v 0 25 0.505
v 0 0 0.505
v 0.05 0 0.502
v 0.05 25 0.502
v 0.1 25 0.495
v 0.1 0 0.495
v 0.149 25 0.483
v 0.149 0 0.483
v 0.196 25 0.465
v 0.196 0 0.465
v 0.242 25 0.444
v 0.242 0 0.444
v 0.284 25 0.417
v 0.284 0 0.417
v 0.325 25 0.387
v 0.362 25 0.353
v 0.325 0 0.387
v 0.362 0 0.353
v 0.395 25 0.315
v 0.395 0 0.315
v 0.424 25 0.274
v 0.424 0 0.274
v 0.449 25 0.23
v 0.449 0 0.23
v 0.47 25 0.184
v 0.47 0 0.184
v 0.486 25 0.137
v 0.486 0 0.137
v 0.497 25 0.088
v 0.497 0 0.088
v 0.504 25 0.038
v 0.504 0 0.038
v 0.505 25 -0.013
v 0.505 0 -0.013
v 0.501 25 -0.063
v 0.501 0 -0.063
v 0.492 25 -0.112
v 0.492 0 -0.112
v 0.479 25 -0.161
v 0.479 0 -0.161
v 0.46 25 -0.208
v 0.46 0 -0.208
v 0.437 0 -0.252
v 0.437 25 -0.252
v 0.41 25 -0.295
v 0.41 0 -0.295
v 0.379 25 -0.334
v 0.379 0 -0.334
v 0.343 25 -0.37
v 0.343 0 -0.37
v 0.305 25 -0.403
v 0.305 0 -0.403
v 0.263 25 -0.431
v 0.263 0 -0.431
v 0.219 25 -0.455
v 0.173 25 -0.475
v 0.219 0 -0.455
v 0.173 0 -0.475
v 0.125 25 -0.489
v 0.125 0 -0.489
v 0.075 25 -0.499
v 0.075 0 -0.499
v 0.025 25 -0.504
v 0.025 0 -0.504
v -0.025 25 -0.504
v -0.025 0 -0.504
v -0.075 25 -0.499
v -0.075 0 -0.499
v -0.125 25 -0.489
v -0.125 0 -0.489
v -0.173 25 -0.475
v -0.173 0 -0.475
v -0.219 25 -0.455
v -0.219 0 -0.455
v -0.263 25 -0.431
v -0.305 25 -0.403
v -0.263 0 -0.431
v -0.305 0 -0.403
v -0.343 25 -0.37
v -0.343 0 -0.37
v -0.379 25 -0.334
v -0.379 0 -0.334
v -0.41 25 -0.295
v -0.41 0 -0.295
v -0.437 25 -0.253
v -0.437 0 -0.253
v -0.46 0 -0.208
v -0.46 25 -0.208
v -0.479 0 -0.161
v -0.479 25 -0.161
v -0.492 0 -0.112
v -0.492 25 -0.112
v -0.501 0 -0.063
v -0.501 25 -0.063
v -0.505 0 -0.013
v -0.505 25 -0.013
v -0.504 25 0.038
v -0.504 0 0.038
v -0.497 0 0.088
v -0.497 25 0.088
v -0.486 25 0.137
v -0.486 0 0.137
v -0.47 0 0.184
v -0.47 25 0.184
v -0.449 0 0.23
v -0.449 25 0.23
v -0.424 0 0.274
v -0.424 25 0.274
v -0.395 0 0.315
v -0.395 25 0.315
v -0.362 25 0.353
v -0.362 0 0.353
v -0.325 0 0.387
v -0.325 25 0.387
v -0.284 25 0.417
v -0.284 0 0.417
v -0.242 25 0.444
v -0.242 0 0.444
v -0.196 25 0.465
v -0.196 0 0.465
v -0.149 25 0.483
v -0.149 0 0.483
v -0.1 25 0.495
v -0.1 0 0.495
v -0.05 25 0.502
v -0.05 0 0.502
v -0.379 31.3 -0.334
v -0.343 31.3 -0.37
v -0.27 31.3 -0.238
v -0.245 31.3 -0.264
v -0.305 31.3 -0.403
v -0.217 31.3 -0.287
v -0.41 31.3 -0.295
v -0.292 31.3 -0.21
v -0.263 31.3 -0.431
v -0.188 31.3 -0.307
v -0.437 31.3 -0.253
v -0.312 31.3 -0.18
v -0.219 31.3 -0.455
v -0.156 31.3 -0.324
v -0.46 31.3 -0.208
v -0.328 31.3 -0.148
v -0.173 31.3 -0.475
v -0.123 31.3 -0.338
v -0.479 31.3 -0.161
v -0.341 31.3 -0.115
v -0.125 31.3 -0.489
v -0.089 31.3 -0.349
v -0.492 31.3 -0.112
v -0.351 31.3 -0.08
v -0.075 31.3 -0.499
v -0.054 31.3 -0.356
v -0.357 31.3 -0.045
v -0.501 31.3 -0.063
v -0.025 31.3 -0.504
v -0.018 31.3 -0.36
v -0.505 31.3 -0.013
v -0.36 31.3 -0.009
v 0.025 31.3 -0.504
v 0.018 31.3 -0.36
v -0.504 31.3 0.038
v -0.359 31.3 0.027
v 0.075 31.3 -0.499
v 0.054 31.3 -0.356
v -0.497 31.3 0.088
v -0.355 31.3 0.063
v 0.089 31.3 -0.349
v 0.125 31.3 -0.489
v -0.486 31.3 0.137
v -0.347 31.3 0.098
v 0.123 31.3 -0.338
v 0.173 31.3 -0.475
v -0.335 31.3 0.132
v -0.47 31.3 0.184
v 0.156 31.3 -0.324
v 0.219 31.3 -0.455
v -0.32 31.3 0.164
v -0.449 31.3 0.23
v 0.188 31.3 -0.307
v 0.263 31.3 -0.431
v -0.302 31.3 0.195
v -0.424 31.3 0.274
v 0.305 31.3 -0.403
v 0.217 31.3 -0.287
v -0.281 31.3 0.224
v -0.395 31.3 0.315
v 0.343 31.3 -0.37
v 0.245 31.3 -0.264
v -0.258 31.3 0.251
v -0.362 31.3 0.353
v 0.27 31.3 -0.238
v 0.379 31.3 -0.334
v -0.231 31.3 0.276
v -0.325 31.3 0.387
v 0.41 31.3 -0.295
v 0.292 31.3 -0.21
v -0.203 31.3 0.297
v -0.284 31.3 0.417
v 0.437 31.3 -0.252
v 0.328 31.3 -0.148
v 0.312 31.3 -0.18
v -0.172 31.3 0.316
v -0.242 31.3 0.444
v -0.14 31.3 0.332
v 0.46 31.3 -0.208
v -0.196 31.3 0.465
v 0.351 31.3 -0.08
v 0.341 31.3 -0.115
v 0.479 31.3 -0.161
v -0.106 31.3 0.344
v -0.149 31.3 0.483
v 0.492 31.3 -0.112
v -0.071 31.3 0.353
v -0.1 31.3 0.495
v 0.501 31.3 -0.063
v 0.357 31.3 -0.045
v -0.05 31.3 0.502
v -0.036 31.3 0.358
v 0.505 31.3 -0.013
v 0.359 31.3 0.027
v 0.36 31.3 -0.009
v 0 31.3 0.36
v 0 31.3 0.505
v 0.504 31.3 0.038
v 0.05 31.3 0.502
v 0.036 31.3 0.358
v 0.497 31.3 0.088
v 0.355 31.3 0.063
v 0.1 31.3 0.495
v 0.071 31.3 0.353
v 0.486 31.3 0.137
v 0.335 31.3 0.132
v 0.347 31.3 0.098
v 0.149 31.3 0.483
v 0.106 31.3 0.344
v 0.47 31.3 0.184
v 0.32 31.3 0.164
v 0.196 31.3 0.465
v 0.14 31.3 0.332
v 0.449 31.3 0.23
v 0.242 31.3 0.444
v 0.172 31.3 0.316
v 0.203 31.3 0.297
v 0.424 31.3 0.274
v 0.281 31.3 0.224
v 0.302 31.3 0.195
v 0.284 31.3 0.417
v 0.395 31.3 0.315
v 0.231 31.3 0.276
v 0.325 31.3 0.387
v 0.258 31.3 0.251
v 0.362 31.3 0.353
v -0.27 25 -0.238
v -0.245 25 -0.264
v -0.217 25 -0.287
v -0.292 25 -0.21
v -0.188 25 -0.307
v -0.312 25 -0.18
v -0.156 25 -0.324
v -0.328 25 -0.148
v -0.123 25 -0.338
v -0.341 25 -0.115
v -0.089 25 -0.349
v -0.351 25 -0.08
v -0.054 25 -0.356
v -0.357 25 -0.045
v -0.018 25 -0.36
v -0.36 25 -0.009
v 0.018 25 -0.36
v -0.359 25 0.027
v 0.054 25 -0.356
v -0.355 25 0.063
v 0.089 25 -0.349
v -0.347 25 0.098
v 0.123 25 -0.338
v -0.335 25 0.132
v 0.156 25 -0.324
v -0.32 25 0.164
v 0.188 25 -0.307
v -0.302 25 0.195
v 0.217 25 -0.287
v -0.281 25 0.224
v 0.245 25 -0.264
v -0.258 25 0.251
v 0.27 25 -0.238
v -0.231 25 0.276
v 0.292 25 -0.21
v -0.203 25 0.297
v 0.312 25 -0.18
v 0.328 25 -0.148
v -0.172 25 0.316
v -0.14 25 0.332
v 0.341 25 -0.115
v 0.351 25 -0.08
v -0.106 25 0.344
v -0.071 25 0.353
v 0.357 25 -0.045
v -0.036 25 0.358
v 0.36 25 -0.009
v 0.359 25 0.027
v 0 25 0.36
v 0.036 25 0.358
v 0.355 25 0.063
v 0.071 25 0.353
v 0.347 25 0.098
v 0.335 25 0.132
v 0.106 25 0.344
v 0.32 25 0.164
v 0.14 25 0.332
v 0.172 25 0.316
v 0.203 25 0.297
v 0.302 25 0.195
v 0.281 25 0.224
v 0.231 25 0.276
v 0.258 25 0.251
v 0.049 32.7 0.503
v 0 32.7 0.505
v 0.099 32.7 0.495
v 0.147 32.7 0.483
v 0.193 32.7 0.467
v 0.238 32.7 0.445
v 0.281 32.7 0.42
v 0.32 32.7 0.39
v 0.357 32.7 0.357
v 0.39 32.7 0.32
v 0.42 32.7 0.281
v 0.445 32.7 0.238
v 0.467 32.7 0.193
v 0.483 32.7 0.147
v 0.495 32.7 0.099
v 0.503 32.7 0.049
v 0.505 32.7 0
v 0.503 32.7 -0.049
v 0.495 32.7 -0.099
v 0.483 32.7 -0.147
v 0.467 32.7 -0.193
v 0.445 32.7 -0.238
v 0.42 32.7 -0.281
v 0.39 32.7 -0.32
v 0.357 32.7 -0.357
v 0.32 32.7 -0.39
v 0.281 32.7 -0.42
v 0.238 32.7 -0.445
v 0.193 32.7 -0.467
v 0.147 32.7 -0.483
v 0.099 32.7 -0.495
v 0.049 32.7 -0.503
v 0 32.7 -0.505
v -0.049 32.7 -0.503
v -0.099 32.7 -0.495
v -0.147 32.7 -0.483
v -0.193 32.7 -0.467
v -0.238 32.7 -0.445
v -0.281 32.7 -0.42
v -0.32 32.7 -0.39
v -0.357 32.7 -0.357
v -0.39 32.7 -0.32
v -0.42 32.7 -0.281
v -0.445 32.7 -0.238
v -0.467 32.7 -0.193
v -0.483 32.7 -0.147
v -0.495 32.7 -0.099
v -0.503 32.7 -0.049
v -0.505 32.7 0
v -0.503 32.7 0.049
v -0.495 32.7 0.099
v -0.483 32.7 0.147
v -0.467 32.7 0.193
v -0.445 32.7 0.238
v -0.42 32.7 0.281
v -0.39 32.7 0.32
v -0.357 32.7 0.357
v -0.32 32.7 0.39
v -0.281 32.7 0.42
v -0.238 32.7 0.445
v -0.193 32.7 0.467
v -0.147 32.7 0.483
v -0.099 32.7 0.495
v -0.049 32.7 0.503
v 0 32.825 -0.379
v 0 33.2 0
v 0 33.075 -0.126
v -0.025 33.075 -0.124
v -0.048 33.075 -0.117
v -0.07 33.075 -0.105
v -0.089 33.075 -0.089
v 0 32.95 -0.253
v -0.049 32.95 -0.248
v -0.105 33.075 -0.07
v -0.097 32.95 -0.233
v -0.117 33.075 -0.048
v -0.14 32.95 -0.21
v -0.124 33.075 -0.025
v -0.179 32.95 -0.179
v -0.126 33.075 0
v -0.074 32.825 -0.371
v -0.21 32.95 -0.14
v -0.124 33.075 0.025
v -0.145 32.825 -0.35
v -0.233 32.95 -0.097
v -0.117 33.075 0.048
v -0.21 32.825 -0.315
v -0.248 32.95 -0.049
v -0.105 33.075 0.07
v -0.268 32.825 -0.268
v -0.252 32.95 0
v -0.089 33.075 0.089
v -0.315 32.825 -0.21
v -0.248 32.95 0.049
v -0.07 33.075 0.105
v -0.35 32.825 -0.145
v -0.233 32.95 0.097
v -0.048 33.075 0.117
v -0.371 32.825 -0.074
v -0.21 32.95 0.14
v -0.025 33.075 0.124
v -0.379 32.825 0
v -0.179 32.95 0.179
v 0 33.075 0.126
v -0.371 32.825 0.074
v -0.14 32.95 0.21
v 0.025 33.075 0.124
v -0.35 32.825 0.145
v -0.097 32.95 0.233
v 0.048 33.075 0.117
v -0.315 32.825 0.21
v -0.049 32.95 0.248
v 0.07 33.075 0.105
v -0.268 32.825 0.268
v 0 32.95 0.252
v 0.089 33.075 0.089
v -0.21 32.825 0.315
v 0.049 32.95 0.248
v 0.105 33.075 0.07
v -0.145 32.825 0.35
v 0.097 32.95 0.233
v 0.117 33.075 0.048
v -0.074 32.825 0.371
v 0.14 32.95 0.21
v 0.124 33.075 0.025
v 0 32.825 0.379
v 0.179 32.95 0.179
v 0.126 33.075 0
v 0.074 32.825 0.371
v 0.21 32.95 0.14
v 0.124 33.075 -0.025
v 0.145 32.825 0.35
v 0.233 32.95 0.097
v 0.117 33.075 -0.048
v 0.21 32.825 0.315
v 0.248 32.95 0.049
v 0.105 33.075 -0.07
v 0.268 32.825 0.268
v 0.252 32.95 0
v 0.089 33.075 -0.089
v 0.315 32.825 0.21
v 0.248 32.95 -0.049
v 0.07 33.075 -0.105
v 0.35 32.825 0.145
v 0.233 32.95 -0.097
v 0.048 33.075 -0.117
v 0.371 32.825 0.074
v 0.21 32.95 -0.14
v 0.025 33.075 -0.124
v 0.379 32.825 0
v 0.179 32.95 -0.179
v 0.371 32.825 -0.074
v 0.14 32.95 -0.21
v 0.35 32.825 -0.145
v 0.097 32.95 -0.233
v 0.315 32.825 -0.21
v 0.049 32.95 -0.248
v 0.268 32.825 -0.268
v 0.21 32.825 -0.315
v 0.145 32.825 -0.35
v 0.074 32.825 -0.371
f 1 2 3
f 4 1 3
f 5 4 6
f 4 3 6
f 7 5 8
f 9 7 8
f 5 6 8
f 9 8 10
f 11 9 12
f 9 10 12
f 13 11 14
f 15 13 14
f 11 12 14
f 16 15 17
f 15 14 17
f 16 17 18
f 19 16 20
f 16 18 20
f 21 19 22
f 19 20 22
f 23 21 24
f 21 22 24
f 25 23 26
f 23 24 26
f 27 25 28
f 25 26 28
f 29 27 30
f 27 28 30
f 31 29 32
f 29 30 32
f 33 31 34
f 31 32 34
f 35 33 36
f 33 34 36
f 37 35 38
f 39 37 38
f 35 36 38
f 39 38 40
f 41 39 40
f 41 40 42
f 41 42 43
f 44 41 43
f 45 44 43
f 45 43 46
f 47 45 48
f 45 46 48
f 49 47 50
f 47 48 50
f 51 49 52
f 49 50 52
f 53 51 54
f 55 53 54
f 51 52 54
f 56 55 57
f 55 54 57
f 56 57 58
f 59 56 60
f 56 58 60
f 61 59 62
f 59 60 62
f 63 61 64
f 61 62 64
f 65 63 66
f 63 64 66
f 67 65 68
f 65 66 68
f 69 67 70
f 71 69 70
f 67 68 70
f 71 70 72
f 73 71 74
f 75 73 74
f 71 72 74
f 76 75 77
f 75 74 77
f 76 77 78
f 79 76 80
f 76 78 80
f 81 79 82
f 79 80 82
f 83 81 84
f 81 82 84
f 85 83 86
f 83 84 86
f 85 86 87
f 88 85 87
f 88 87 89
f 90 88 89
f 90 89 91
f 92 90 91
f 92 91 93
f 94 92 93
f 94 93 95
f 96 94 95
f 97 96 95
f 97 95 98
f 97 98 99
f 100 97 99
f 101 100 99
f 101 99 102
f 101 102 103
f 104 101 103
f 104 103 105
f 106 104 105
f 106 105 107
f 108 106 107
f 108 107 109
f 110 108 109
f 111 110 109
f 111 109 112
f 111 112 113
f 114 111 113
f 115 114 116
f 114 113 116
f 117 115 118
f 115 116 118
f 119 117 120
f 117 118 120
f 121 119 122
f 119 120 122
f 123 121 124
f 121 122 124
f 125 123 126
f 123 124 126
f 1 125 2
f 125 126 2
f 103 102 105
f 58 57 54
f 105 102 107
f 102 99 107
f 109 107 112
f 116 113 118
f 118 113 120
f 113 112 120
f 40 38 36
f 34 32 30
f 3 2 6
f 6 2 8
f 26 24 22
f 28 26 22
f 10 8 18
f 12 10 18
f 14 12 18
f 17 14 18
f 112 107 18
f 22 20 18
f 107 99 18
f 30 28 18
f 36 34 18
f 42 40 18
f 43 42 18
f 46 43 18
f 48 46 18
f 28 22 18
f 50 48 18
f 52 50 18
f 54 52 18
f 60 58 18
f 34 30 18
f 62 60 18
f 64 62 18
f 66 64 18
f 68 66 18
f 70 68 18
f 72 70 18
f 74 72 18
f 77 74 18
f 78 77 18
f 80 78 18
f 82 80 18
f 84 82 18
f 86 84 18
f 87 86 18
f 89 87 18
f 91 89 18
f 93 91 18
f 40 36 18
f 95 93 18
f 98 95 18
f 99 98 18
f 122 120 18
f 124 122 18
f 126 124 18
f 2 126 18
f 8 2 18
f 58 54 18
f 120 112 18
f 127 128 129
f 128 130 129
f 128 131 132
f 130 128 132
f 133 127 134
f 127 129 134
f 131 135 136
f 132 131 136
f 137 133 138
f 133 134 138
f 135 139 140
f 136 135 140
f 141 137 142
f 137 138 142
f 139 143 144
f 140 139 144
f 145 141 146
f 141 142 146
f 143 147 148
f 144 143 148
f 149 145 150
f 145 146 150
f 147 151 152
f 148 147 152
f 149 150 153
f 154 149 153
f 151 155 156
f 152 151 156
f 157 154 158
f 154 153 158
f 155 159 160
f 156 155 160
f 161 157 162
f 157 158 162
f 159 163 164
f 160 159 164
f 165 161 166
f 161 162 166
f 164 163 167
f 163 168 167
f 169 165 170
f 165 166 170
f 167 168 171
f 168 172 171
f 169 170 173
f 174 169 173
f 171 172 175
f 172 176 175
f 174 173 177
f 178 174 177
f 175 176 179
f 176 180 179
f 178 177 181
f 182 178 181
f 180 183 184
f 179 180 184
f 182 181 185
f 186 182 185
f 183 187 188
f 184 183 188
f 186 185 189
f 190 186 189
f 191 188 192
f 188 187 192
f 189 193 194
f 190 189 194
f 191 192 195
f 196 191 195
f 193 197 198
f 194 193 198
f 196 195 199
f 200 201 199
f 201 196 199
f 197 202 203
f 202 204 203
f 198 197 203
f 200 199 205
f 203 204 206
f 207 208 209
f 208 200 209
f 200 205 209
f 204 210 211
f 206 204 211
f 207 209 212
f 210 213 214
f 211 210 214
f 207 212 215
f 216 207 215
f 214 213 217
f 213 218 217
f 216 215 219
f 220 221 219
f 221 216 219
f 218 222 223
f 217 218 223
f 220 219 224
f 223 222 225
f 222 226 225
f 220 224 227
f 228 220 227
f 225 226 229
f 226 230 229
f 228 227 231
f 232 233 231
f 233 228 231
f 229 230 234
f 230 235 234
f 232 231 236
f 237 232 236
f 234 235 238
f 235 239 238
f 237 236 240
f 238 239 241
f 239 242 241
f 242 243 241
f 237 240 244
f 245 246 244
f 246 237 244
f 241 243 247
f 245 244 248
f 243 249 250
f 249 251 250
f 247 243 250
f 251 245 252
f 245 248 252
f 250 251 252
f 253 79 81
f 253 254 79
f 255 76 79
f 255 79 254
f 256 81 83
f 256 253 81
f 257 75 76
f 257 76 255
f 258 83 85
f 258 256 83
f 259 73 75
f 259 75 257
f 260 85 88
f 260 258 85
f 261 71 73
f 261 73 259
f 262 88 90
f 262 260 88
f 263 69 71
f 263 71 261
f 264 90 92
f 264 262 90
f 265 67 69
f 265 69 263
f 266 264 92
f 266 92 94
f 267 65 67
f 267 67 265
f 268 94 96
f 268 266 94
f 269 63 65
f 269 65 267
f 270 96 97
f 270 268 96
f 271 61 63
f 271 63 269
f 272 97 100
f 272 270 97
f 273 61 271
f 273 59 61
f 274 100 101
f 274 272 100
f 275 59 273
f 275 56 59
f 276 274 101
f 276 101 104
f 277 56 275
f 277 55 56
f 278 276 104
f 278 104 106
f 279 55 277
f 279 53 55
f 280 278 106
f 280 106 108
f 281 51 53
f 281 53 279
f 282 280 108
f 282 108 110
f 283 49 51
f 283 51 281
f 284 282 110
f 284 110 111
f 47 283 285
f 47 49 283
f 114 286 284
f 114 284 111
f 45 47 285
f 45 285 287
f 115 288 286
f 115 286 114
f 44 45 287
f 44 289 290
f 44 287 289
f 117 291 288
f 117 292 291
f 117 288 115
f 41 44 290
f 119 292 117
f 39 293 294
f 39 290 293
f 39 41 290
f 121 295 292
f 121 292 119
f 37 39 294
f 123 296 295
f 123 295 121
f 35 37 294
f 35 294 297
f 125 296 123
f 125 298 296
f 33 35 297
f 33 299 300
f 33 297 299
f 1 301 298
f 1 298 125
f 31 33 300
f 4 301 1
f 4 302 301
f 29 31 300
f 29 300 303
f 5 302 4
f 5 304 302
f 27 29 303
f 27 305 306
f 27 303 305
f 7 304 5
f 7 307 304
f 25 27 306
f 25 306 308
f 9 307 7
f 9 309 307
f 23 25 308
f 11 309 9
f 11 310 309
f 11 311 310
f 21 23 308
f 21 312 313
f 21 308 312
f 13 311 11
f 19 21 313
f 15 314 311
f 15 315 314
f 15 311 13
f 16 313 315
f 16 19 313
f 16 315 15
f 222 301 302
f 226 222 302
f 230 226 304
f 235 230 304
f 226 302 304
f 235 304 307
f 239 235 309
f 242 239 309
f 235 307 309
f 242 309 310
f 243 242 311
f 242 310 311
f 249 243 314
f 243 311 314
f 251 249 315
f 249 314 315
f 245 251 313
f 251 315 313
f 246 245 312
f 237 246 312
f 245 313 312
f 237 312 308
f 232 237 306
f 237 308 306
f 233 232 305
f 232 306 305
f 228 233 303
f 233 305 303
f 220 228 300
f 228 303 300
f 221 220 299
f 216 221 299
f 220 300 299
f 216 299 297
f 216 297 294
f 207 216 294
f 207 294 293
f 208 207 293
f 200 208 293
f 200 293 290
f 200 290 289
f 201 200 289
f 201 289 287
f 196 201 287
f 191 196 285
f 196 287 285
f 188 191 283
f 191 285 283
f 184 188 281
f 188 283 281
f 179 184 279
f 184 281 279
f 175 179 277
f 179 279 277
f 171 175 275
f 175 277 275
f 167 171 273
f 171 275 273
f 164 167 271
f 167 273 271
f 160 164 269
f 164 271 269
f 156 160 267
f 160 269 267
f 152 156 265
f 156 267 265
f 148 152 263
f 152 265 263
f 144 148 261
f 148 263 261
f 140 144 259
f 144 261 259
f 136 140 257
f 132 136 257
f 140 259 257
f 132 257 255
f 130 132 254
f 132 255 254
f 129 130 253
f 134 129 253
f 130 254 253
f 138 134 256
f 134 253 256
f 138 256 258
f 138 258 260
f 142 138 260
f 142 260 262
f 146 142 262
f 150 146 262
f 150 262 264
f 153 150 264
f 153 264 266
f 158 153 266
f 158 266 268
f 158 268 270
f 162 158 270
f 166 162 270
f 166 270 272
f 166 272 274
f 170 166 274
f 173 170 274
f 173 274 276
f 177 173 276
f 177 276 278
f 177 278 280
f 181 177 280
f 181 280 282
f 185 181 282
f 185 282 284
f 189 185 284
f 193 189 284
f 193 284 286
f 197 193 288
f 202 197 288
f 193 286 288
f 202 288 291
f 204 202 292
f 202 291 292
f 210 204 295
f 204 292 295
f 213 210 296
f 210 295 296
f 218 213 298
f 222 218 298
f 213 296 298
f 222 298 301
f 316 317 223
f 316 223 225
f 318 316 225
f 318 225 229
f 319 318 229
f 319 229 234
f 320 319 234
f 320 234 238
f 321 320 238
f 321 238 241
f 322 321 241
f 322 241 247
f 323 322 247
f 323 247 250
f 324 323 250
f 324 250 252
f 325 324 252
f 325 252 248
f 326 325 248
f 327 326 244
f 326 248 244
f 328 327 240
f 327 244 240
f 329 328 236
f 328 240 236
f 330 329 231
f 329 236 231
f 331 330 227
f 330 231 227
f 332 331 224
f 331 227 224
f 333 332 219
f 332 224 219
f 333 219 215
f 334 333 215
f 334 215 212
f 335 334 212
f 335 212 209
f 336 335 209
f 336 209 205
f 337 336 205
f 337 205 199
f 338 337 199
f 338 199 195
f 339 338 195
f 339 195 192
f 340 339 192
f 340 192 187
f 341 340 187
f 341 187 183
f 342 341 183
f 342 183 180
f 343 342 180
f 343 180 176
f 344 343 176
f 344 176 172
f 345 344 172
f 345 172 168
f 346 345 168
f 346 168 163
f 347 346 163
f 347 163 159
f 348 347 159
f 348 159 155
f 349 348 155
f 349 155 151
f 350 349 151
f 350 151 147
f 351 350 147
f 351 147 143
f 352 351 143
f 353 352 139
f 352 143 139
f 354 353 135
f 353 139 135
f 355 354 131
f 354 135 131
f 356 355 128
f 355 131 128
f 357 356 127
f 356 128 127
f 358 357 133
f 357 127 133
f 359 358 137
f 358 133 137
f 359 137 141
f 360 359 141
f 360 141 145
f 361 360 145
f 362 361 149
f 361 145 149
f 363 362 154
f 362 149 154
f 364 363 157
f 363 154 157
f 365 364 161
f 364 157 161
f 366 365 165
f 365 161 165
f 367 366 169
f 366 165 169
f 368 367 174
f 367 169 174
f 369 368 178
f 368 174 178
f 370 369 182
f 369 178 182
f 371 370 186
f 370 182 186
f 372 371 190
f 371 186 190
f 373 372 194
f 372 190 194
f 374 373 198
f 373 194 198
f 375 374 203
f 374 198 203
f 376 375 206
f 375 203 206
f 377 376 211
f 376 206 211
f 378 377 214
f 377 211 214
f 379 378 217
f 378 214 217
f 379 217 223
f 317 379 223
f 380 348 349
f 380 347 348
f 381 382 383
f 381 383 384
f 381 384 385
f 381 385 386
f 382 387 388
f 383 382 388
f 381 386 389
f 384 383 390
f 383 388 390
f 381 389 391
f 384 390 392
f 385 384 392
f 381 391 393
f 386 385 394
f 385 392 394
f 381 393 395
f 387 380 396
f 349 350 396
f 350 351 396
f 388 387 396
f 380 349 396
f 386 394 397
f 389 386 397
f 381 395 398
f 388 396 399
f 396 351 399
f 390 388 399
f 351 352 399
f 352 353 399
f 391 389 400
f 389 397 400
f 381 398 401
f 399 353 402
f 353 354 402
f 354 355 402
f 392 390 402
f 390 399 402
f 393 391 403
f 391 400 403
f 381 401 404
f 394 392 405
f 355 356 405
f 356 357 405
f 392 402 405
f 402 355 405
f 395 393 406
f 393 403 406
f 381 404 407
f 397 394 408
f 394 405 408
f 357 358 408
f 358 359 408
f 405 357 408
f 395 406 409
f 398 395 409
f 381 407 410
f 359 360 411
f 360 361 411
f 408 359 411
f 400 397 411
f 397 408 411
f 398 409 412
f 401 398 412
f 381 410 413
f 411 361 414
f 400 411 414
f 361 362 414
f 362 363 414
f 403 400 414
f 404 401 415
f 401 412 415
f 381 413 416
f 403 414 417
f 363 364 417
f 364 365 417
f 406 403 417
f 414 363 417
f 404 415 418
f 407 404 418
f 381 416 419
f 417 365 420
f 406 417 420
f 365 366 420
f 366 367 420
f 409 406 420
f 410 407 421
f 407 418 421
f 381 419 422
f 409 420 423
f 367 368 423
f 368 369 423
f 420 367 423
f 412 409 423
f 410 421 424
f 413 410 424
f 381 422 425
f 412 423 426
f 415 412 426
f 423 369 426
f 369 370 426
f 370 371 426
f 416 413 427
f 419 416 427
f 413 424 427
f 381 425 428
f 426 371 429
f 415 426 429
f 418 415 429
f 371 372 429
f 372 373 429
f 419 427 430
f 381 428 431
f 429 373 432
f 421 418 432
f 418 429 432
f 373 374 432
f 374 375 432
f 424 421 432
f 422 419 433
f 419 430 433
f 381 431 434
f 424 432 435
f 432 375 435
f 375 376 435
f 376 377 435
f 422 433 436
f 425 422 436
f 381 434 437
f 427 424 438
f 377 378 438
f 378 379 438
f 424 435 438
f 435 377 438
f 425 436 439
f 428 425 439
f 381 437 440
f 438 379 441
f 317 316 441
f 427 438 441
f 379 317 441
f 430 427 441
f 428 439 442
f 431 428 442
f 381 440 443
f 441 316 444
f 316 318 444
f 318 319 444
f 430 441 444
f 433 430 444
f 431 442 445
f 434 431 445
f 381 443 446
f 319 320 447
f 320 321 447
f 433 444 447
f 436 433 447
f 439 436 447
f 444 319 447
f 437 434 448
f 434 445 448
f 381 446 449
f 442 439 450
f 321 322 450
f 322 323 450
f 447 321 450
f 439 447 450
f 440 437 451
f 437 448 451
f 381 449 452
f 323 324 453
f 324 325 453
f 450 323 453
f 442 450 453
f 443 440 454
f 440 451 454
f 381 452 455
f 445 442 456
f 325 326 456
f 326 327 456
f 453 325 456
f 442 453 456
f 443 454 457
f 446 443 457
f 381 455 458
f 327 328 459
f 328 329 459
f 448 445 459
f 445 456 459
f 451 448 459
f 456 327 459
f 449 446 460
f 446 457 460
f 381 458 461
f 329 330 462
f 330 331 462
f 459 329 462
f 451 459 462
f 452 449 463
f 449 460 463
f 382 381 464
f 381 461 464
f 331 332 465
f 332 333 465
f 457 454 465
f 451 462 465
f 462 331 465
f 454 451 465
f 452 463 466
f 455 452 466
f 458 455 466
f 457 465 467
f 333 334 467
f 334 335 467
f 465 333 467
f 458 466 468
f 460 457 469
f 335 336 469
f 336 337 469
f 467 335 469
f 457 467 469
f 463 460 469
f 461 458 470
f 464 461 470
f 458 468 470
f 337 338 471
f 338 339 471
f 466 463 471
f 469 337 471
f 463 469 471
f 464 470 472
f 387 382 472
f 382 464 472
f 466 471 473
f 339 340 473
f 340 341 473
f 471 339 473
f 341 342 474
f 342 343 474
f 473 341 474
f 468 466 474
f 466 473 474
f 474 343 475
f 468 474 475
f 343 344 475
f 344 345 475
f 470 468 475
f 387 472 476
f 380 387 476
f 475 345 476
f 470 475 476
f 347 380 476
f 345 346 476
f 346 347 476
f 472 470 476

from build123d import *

# Parameters (mm, degrees)
SKETCH1_R           = 0.505
BOSS_EXTRUDE1_DEPTH = 25
SKETCH2_R           = 0.36
BOSS_EXTRUDE2_DEPTH = 6.3
SKETCH3_R           = 0.505
BOSS_EXTRUDE3_DEPTH = 1.4


with BuildPart() as part:
    # Sketch1 → Boss-Extrude1 (new body)
    with BuildSketch(Plane(origin=(0, 0, 0), x_dir=(1, 0, 0), z_dir=(0, 1, 0))):
        with Locations(Location((0, 0, 0), (0, 0, 270))):
            Circle(SKETCH1_R)
    extrude(amount=BOSS_EXTRUDE1_DEPTH)

    # Sketch2 → Boss-Extrude2 (add)
    with BuildSketch(Plane(origin=(0, 25, 0), x_dir=(1, 0, 0), z_dir=(0, 1, 0))):
        with Locations(Location((0, 0, 0), (0, 0, 270))):
            Circle(SKETCH2_R)
    extrude(amount=BOSS_EXTRUDE2_DEPTH)

    # Sketch3 → Boss-Extrude3 (add)
    with BuildSketch(Plane(origin=(0, 31.3, 0), x_dir=(1, 0, 0), z_dir=(0, 1, 0))):
        with Locations(Location((0, 0, 0), (0, 0, 270))):
            Circle(SKETCH3_R)
    extrude(amount=BOSS_EXTRUDE3_DEPTH)

    # Sketch4 → Revolve1 (revolve)
    with BuildSketch(Plane.XY, mode=Mode.PRIVATE) as revolve1_sk:
        Polygon((0, 32.7), (0, 33.2), (0.505, 32.7), align=None)
    revolve(revolve1_sk.sketch.rotate(Axis((0, 32.7, 0), (0, 1, 0)), 90), axis=Axis((0, 32.7, 0), (0, 1, 0)))


solid = part.part
